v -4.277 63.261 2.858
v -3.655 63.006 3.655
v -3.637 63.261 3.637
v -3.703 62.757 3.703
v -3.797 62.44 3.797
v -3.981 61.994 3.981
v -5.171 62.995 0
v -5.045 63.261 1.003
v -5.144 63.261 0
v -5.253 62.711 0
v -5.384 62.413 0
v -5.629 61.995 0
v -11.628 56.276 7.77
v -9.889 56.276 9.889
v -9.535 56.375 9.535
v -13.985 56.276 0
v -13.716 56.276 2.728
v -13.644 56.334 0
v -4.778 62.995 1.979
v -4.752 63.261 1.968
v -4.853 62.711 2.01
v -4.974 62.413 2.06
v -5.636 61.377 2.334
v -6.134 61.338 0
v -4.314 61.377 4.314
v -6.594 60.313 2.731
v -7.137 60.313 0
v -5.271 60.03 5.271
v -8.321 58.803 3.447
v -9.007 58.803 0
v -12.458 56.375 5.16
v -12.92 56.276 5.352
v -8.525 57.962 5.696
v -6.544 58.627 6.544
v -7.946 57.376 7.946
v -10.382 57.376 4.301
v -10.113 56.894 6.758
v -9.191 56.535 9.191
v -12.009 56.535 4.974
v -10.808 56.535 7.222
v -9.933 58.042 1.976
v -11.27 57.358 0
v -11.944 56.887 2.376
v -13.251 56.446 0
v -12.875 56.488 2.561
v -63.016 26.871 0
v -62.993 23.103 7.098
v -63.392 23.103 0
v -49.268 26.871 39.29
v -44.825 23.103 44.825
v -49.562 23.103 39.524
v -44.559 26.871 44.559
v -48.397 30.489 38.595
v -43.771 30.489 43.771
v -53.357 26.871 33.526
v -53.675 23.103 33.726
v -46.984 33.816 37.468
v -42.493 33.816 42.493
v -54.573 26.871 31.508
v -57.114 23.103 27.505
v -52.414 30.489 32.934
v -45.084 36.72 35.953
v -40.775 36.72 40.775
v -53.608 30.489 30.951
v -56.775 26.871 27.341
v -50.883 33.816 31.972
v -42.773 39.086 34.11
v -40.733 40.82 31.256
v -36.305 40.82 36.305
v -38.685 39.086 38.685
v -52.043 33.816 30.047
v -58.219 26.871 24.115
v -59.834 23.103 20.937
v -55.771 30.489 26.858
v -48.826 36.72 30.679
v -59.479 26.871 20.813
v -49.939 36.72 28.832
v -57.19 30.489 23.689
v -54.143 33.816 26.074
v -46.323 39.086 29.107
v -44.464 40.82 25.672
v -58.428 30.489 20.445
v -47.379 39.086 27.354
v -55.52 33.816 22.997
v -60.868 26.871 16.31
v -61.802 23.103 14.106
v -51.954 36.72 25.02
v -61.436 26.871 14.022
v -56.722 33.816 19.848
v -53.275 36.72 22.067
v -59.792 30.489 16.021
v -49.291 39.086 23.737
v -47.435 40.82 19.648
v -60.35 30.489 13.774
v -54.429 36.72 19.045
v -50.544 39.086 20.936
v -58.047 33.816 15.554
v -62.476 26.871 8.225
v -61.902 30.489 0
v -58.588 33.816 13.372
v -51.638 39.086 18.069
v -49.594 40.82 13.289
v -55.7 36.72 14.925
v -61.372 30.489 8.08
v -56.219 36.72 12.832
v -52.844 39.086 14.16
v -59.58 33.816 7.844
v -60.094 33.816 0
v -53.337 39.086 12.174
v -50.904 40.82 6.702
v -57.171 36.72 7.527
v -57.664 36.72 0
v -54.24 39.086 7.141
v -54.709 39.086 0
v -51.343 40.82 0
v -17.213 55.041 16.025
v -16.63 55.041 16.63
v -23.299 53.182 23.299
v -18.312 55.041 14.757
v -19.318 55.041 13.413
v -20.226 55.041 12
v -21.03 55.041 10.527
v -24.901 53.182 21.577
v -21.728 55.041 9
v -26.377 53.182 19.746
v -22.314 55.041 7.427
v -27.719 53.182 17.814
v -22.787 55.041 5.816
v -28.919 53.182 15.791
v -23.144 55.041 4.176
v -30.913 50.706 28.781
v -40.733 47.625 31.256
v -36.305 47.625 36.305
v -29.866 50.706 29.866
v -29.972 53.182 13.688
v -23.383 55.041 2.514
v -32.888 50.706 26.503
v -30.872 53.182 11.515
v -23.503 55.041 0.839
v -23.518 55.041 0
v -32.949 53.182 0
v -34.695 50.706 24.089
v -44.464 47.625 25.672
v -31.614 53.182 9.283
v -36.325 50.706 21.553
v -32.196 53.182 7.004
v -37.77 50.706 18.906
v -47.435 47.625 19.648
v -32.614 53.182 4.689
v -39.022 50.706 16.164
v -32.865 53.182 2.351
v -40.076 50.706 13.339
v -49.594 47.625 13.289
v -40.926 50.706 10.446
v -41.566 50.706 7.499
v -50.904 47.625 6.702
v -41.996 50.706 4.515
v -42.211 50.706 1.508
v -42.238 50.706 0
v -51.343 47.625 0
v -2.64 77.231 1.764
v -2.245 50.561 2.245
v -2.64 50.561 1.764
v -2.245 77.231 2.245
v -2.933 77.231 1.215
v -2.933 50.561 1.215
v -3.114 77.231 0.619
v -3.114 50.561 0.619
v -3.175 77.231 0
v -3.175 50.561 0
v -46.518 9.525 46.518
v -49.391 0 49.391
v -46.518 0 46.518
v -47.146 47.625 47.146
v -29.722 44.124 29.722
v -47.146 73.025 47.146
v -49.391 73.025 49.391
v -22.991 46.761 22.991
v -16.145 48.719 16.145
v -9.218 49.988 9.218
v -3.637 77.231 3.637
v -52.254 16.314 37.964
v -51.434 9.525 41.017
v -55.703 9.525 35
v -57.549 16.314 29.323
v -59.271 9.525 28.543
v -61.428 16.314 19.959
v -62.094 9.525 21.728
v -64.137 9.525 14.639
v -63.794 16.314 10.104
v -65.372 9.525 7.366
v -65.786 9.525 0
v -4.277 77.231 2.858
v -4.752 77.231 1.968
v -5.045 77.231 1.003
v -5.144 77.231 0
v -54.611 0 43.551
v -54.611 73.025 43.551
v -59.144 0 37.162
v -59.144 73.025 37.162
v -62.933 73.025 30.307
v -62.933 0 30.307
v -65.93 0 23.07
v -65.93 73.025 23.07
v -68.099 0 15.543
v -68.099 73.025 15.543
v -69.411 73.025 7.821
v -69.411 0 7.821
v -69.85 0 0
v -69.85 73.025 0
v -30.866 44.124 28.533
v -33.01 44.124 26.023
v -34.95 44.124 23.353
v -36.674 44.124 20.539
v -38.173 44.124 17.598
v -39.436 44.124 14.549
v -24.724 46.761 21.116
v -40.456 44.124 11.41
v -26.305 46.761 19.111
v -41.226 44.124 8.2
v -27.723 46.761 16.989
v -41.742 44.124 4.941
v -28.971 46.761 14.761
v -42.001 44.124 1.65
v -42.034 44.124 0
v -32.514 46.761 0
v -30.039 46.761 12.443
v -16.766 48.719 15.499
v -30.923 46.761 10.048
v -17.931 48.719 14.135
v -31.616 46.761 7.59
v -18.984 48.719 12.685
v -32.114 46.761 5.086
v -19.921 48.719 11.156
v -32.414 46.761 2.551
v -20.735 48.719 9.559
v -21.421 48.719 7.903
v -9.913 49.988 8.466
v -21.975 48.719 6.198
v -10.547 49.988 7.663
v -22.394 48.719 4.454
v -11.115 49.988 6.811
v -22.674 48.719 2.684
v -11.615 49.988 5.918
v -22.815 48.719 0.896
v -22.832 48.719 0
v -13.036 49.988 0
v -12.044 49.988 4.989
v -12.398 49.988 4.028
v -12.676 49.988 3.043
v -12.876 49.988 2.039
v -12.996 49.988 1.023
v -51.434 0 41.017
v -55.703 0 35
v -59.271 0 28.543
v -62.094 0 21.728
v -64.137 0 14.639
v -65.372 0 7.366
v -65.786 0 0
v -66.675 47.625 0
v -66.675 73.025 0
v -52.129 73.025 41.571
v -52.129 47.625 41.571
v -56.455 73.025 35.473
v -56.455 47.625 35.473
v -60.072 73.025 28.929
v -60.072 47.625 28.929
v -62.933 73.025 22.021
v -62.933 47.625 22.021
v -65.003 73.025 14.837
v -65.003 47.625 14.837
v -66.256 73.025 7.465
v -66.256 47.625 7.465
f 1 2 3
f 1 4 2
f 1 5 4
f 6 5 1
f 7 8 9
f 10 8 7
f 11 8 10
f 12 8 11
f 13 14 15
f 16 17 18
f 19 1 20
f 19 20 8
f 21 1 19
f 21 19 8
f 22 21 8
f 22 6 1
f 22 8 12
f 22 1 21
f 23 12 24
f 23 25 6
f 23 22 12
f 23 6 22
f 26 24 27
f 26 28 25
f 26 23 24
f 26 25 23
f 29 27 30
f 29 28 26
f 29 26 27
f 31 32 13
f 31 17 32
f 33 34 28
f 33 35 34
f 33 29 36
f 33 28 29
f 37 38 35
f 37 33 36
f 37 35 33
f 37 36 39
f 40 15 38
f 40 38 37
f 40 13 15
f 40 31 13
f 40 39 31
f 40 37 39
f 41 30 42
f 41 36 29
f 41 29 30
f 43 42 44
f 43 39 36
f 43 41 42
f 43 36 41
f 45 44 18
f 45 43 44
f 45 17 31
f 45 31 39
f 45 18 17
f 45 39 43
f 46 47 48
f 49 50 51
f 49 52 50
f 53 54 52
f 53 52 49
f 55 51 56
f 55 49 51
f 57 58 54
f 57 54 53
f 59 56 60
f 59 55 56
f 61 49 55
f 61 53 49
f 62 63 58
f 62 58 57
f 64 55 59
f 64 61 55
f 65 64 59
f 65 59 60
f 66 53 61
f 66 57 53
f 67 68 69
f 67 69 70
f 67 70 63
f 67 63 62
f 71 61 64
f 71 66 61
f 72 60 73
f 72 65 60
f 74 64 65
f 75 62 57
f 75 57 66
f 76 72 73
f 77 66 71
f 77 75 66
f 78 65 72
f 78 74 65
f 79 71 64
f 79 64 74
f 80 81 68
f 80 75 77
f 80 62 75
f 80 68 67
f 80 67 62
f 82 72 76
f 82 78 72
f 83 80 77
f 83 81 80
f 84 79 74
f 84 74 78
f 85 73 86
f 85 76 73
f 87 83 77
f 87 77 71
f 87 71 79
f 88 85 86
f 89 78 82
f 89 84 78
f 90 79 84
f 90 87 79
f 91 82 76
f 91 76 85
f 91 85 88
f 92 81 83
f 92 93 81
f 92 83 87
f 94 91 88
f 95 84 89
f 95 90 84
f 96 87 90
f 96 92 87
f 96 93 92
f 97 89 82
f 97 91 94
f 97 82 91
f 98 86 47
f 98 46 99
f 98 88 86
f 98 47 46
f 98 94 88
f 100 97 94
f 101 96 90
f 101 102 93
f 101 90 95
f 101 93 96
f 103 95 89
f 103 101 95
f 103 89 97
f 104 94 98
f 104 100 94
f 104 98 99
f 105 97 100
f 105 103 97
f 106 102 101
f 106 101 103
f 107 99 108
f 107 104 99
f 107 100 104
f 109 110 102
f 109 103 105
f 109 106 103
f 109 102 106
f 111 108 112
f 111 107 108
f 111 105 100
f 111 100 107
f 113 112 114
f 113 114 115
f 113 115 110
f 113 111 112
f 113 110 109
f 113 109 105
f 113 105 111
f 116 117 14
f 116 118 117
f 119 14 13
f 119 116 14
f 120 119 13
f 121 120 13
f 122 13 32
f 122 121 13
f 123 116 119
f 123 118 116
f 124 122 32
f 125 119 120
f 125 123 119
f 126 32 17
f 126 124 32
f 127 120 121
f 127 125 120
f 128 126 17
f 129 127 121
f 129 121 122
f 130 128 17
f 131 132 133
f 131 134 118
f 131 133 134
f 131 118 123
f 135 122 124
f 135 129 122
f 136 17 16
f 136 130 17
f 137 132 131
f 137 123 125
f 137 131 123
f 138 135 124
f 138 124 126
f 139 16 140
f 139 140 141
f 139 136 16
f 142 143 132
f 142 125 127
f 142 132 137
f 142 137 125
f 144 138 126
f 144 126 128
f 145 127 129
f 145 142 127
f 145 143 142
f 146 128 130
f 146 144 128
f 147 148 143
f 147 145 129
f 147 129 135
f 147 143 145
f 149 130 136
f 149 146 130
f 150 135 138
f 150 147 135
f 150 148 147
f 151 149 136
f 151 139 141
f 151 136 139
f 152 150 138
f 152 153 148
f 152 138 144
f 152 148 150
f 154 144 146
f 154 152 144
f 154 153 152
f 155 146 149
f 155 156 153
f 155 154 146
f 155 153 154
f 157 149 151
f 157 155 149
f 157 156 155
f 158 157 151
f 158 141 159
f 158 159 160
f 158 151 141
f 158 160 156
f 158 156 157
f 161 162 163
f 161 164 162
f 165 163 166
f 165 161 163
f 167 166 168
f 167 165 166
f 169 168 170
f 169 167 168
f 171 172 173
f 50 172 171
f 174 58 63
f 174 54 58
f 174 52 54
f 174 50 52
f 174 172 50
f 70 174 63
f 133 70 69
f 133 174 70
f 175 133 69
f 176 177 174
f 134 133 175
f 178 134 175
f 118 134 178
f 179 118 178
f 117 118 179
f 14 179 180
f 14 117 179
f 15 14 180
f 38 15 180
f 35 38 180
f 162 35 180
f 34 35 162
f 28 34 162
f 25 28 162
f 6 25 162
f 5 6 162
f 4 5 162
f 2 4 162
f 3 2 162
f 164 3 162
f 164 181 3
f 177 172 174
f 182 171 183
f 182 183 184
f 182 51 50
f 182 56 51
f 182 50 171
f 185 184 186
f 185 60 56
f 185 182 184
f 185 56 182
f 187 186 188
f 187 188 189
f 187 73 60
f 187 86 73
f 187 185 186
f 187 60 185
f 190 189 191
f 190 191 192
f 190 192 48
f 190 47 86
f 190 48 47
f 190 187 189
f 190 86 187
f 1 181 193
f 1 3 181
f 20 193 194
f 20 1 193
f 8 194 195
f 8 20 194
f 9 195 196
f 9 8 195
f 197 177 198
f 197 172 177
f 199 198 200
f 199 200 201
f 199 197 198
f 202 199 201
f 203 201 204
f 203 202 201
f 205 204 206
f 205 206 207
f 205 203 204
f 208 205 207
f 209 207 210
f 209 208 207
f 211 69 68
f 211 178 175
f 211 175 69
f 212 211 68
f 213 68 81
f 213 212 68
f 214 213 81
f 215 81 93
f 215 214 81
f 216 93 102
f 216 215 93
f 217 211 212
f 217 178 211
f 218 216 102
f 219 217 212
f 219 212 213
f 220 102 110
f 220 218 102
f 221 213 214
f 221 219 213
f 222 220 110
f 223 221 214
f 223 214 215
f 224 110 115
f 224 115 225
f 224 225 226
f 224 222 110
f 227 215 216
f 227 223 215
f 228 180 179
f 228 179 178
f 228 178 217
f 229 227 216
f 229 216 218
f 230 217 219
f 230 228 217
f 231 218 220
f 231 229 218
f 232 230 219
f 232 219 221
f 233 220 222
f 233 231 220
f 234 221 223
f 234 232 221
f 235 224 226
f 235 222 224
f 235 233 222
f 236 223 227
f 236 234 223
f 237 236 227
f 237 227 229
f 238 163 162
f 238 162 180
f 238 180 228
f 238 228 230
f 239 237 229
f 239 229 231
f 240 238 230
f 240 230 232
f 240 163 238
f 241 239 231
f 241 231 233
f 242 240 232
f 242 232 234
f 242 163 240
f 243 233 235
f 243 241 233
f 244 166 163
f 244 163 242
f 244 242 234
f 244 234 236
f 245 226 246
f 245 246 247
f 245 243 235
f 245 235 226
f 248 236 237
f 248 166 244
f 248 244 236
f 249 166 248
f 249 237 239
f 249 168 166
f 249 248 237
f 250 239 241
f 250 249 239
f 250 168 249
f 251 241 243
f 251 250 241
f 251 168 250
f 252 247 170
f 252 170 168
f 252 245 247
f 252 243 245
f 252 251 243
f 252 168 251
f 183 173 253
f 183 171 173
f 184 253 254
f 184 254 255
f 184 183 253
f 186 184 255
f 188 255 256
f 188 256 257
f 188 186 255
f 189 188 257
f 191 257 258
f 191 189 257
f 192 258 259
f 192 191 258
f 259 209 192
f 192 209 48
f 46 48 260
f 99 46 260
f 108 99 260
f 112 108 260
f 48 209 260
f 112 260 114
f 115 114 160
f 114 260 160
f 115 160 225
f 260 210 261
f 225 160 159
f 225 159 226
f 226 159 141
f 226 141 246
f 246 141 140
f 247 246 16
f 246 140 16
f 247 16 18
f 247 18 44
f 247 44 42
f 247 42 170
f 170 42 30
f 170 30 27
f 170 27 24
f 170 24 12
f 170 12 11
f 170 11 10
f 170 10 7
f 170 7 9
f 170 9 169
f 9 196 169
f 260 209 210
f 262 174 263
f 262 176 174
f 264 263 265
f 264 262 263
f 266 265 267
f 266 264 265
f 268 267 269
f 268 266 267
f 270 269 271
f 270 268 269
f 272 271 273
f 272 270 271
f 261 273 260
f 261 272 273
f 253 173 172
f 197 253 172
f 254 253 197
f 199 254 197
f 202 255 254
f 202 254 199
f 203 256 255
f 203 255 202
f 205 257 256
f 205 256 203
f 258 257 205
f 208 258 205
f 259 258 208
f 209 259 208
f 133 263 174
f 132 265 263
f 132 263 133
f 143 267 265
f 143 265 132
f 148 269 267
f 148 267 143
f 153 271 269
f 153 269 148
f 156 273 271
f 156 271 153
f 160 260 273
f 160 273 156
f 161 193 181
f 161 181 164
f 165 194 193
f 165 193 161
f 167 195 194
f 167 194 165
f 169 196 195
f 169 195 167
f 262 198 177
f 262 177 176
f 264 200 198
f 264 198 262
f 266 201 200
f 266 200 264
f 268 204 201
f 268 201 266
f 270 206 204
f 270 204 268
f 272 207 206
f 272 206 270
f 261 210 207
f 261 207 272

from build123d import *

# Parameters (mm, degrees)
SKETCH2_W          = 97.871859654
SKETCH2_H          = 113.417127273
CUT_REVOLVE1_ANGLE = 315


with BuildPart() as part:
    # Sketch1 → Revolve2 (revolve)
    with BuildSketch(Plane.XY):
        with BuildLine():
            Line((-69.85, 73.025), (-69.85, 10.954807942))
            Line((-69.85, 10.954807942), (-69.85, 0))
            Line((-69.85, 0), (-67.3735, 0))
            Line((-67.3735, 0), (-65.786, 0))
            Line((-65.786, 0), (-65.786, 9.525))
            Line((-65.786, 9.525), (-63.391760989, 23.103404173))
            ThreePointArc((-63.391760989, 23.103404173), (-60.094186985, 33.816180435), (-51.343091672, 40.820172182))
            ThreePointArc((-51.343091672, 40.820172182), (-27.690740484, 47.825337172), (-3.175, 50.561122579))
            Line((-3.175, 50.561122579), (-3.175, 77.231122579))
            Line((-3.175, 77.231122579), (-5.1435, 77.231122579))
            Line((-5.1435, 77.231122579), (-5.1435, 63.261122579))
            add(Edge.make_bspline(
                [(-5.1435, 63.261122579), (-5.1435, 60.992448788), (-11.791391123, 56.487113553), (-13.98475393, 56.276122579)],
                knots=[0, 0, 0, 0, 1, 1, 1, 1], degree=3))
            ThreePointArc((-13.98475393, 56.276122579), (-32.949086986, 53.181992221), (-51.343091672, 47.625))
            Line((-51.343091672, 47.625), (-66.675, 47.625))
            Line((-66.675, 47.625), (-66.675, 73.025))
            Line((-66.675, 73.025), (-69.85, 73.025))
        make_face()
    revolve(axis=Axis((0, 127.060987048, 0), (0, -1, 0)))

    # Sketch2 → Cut-Revolve1 (revolve, cut)
    with BuildSketch(Plane.XY):
        with Locations((-48.935929827, 30.428788157)):
            Rectangle(SKETCH2_W, SKETCH2_H)
    revolve(axis=Axis((0, 127.060987048, 0), (0, -1, 0)), revolution_arc=CUT_REVOLVE1_ANGLE, mode=Mode.SUBTRACT)


solid = part.part
